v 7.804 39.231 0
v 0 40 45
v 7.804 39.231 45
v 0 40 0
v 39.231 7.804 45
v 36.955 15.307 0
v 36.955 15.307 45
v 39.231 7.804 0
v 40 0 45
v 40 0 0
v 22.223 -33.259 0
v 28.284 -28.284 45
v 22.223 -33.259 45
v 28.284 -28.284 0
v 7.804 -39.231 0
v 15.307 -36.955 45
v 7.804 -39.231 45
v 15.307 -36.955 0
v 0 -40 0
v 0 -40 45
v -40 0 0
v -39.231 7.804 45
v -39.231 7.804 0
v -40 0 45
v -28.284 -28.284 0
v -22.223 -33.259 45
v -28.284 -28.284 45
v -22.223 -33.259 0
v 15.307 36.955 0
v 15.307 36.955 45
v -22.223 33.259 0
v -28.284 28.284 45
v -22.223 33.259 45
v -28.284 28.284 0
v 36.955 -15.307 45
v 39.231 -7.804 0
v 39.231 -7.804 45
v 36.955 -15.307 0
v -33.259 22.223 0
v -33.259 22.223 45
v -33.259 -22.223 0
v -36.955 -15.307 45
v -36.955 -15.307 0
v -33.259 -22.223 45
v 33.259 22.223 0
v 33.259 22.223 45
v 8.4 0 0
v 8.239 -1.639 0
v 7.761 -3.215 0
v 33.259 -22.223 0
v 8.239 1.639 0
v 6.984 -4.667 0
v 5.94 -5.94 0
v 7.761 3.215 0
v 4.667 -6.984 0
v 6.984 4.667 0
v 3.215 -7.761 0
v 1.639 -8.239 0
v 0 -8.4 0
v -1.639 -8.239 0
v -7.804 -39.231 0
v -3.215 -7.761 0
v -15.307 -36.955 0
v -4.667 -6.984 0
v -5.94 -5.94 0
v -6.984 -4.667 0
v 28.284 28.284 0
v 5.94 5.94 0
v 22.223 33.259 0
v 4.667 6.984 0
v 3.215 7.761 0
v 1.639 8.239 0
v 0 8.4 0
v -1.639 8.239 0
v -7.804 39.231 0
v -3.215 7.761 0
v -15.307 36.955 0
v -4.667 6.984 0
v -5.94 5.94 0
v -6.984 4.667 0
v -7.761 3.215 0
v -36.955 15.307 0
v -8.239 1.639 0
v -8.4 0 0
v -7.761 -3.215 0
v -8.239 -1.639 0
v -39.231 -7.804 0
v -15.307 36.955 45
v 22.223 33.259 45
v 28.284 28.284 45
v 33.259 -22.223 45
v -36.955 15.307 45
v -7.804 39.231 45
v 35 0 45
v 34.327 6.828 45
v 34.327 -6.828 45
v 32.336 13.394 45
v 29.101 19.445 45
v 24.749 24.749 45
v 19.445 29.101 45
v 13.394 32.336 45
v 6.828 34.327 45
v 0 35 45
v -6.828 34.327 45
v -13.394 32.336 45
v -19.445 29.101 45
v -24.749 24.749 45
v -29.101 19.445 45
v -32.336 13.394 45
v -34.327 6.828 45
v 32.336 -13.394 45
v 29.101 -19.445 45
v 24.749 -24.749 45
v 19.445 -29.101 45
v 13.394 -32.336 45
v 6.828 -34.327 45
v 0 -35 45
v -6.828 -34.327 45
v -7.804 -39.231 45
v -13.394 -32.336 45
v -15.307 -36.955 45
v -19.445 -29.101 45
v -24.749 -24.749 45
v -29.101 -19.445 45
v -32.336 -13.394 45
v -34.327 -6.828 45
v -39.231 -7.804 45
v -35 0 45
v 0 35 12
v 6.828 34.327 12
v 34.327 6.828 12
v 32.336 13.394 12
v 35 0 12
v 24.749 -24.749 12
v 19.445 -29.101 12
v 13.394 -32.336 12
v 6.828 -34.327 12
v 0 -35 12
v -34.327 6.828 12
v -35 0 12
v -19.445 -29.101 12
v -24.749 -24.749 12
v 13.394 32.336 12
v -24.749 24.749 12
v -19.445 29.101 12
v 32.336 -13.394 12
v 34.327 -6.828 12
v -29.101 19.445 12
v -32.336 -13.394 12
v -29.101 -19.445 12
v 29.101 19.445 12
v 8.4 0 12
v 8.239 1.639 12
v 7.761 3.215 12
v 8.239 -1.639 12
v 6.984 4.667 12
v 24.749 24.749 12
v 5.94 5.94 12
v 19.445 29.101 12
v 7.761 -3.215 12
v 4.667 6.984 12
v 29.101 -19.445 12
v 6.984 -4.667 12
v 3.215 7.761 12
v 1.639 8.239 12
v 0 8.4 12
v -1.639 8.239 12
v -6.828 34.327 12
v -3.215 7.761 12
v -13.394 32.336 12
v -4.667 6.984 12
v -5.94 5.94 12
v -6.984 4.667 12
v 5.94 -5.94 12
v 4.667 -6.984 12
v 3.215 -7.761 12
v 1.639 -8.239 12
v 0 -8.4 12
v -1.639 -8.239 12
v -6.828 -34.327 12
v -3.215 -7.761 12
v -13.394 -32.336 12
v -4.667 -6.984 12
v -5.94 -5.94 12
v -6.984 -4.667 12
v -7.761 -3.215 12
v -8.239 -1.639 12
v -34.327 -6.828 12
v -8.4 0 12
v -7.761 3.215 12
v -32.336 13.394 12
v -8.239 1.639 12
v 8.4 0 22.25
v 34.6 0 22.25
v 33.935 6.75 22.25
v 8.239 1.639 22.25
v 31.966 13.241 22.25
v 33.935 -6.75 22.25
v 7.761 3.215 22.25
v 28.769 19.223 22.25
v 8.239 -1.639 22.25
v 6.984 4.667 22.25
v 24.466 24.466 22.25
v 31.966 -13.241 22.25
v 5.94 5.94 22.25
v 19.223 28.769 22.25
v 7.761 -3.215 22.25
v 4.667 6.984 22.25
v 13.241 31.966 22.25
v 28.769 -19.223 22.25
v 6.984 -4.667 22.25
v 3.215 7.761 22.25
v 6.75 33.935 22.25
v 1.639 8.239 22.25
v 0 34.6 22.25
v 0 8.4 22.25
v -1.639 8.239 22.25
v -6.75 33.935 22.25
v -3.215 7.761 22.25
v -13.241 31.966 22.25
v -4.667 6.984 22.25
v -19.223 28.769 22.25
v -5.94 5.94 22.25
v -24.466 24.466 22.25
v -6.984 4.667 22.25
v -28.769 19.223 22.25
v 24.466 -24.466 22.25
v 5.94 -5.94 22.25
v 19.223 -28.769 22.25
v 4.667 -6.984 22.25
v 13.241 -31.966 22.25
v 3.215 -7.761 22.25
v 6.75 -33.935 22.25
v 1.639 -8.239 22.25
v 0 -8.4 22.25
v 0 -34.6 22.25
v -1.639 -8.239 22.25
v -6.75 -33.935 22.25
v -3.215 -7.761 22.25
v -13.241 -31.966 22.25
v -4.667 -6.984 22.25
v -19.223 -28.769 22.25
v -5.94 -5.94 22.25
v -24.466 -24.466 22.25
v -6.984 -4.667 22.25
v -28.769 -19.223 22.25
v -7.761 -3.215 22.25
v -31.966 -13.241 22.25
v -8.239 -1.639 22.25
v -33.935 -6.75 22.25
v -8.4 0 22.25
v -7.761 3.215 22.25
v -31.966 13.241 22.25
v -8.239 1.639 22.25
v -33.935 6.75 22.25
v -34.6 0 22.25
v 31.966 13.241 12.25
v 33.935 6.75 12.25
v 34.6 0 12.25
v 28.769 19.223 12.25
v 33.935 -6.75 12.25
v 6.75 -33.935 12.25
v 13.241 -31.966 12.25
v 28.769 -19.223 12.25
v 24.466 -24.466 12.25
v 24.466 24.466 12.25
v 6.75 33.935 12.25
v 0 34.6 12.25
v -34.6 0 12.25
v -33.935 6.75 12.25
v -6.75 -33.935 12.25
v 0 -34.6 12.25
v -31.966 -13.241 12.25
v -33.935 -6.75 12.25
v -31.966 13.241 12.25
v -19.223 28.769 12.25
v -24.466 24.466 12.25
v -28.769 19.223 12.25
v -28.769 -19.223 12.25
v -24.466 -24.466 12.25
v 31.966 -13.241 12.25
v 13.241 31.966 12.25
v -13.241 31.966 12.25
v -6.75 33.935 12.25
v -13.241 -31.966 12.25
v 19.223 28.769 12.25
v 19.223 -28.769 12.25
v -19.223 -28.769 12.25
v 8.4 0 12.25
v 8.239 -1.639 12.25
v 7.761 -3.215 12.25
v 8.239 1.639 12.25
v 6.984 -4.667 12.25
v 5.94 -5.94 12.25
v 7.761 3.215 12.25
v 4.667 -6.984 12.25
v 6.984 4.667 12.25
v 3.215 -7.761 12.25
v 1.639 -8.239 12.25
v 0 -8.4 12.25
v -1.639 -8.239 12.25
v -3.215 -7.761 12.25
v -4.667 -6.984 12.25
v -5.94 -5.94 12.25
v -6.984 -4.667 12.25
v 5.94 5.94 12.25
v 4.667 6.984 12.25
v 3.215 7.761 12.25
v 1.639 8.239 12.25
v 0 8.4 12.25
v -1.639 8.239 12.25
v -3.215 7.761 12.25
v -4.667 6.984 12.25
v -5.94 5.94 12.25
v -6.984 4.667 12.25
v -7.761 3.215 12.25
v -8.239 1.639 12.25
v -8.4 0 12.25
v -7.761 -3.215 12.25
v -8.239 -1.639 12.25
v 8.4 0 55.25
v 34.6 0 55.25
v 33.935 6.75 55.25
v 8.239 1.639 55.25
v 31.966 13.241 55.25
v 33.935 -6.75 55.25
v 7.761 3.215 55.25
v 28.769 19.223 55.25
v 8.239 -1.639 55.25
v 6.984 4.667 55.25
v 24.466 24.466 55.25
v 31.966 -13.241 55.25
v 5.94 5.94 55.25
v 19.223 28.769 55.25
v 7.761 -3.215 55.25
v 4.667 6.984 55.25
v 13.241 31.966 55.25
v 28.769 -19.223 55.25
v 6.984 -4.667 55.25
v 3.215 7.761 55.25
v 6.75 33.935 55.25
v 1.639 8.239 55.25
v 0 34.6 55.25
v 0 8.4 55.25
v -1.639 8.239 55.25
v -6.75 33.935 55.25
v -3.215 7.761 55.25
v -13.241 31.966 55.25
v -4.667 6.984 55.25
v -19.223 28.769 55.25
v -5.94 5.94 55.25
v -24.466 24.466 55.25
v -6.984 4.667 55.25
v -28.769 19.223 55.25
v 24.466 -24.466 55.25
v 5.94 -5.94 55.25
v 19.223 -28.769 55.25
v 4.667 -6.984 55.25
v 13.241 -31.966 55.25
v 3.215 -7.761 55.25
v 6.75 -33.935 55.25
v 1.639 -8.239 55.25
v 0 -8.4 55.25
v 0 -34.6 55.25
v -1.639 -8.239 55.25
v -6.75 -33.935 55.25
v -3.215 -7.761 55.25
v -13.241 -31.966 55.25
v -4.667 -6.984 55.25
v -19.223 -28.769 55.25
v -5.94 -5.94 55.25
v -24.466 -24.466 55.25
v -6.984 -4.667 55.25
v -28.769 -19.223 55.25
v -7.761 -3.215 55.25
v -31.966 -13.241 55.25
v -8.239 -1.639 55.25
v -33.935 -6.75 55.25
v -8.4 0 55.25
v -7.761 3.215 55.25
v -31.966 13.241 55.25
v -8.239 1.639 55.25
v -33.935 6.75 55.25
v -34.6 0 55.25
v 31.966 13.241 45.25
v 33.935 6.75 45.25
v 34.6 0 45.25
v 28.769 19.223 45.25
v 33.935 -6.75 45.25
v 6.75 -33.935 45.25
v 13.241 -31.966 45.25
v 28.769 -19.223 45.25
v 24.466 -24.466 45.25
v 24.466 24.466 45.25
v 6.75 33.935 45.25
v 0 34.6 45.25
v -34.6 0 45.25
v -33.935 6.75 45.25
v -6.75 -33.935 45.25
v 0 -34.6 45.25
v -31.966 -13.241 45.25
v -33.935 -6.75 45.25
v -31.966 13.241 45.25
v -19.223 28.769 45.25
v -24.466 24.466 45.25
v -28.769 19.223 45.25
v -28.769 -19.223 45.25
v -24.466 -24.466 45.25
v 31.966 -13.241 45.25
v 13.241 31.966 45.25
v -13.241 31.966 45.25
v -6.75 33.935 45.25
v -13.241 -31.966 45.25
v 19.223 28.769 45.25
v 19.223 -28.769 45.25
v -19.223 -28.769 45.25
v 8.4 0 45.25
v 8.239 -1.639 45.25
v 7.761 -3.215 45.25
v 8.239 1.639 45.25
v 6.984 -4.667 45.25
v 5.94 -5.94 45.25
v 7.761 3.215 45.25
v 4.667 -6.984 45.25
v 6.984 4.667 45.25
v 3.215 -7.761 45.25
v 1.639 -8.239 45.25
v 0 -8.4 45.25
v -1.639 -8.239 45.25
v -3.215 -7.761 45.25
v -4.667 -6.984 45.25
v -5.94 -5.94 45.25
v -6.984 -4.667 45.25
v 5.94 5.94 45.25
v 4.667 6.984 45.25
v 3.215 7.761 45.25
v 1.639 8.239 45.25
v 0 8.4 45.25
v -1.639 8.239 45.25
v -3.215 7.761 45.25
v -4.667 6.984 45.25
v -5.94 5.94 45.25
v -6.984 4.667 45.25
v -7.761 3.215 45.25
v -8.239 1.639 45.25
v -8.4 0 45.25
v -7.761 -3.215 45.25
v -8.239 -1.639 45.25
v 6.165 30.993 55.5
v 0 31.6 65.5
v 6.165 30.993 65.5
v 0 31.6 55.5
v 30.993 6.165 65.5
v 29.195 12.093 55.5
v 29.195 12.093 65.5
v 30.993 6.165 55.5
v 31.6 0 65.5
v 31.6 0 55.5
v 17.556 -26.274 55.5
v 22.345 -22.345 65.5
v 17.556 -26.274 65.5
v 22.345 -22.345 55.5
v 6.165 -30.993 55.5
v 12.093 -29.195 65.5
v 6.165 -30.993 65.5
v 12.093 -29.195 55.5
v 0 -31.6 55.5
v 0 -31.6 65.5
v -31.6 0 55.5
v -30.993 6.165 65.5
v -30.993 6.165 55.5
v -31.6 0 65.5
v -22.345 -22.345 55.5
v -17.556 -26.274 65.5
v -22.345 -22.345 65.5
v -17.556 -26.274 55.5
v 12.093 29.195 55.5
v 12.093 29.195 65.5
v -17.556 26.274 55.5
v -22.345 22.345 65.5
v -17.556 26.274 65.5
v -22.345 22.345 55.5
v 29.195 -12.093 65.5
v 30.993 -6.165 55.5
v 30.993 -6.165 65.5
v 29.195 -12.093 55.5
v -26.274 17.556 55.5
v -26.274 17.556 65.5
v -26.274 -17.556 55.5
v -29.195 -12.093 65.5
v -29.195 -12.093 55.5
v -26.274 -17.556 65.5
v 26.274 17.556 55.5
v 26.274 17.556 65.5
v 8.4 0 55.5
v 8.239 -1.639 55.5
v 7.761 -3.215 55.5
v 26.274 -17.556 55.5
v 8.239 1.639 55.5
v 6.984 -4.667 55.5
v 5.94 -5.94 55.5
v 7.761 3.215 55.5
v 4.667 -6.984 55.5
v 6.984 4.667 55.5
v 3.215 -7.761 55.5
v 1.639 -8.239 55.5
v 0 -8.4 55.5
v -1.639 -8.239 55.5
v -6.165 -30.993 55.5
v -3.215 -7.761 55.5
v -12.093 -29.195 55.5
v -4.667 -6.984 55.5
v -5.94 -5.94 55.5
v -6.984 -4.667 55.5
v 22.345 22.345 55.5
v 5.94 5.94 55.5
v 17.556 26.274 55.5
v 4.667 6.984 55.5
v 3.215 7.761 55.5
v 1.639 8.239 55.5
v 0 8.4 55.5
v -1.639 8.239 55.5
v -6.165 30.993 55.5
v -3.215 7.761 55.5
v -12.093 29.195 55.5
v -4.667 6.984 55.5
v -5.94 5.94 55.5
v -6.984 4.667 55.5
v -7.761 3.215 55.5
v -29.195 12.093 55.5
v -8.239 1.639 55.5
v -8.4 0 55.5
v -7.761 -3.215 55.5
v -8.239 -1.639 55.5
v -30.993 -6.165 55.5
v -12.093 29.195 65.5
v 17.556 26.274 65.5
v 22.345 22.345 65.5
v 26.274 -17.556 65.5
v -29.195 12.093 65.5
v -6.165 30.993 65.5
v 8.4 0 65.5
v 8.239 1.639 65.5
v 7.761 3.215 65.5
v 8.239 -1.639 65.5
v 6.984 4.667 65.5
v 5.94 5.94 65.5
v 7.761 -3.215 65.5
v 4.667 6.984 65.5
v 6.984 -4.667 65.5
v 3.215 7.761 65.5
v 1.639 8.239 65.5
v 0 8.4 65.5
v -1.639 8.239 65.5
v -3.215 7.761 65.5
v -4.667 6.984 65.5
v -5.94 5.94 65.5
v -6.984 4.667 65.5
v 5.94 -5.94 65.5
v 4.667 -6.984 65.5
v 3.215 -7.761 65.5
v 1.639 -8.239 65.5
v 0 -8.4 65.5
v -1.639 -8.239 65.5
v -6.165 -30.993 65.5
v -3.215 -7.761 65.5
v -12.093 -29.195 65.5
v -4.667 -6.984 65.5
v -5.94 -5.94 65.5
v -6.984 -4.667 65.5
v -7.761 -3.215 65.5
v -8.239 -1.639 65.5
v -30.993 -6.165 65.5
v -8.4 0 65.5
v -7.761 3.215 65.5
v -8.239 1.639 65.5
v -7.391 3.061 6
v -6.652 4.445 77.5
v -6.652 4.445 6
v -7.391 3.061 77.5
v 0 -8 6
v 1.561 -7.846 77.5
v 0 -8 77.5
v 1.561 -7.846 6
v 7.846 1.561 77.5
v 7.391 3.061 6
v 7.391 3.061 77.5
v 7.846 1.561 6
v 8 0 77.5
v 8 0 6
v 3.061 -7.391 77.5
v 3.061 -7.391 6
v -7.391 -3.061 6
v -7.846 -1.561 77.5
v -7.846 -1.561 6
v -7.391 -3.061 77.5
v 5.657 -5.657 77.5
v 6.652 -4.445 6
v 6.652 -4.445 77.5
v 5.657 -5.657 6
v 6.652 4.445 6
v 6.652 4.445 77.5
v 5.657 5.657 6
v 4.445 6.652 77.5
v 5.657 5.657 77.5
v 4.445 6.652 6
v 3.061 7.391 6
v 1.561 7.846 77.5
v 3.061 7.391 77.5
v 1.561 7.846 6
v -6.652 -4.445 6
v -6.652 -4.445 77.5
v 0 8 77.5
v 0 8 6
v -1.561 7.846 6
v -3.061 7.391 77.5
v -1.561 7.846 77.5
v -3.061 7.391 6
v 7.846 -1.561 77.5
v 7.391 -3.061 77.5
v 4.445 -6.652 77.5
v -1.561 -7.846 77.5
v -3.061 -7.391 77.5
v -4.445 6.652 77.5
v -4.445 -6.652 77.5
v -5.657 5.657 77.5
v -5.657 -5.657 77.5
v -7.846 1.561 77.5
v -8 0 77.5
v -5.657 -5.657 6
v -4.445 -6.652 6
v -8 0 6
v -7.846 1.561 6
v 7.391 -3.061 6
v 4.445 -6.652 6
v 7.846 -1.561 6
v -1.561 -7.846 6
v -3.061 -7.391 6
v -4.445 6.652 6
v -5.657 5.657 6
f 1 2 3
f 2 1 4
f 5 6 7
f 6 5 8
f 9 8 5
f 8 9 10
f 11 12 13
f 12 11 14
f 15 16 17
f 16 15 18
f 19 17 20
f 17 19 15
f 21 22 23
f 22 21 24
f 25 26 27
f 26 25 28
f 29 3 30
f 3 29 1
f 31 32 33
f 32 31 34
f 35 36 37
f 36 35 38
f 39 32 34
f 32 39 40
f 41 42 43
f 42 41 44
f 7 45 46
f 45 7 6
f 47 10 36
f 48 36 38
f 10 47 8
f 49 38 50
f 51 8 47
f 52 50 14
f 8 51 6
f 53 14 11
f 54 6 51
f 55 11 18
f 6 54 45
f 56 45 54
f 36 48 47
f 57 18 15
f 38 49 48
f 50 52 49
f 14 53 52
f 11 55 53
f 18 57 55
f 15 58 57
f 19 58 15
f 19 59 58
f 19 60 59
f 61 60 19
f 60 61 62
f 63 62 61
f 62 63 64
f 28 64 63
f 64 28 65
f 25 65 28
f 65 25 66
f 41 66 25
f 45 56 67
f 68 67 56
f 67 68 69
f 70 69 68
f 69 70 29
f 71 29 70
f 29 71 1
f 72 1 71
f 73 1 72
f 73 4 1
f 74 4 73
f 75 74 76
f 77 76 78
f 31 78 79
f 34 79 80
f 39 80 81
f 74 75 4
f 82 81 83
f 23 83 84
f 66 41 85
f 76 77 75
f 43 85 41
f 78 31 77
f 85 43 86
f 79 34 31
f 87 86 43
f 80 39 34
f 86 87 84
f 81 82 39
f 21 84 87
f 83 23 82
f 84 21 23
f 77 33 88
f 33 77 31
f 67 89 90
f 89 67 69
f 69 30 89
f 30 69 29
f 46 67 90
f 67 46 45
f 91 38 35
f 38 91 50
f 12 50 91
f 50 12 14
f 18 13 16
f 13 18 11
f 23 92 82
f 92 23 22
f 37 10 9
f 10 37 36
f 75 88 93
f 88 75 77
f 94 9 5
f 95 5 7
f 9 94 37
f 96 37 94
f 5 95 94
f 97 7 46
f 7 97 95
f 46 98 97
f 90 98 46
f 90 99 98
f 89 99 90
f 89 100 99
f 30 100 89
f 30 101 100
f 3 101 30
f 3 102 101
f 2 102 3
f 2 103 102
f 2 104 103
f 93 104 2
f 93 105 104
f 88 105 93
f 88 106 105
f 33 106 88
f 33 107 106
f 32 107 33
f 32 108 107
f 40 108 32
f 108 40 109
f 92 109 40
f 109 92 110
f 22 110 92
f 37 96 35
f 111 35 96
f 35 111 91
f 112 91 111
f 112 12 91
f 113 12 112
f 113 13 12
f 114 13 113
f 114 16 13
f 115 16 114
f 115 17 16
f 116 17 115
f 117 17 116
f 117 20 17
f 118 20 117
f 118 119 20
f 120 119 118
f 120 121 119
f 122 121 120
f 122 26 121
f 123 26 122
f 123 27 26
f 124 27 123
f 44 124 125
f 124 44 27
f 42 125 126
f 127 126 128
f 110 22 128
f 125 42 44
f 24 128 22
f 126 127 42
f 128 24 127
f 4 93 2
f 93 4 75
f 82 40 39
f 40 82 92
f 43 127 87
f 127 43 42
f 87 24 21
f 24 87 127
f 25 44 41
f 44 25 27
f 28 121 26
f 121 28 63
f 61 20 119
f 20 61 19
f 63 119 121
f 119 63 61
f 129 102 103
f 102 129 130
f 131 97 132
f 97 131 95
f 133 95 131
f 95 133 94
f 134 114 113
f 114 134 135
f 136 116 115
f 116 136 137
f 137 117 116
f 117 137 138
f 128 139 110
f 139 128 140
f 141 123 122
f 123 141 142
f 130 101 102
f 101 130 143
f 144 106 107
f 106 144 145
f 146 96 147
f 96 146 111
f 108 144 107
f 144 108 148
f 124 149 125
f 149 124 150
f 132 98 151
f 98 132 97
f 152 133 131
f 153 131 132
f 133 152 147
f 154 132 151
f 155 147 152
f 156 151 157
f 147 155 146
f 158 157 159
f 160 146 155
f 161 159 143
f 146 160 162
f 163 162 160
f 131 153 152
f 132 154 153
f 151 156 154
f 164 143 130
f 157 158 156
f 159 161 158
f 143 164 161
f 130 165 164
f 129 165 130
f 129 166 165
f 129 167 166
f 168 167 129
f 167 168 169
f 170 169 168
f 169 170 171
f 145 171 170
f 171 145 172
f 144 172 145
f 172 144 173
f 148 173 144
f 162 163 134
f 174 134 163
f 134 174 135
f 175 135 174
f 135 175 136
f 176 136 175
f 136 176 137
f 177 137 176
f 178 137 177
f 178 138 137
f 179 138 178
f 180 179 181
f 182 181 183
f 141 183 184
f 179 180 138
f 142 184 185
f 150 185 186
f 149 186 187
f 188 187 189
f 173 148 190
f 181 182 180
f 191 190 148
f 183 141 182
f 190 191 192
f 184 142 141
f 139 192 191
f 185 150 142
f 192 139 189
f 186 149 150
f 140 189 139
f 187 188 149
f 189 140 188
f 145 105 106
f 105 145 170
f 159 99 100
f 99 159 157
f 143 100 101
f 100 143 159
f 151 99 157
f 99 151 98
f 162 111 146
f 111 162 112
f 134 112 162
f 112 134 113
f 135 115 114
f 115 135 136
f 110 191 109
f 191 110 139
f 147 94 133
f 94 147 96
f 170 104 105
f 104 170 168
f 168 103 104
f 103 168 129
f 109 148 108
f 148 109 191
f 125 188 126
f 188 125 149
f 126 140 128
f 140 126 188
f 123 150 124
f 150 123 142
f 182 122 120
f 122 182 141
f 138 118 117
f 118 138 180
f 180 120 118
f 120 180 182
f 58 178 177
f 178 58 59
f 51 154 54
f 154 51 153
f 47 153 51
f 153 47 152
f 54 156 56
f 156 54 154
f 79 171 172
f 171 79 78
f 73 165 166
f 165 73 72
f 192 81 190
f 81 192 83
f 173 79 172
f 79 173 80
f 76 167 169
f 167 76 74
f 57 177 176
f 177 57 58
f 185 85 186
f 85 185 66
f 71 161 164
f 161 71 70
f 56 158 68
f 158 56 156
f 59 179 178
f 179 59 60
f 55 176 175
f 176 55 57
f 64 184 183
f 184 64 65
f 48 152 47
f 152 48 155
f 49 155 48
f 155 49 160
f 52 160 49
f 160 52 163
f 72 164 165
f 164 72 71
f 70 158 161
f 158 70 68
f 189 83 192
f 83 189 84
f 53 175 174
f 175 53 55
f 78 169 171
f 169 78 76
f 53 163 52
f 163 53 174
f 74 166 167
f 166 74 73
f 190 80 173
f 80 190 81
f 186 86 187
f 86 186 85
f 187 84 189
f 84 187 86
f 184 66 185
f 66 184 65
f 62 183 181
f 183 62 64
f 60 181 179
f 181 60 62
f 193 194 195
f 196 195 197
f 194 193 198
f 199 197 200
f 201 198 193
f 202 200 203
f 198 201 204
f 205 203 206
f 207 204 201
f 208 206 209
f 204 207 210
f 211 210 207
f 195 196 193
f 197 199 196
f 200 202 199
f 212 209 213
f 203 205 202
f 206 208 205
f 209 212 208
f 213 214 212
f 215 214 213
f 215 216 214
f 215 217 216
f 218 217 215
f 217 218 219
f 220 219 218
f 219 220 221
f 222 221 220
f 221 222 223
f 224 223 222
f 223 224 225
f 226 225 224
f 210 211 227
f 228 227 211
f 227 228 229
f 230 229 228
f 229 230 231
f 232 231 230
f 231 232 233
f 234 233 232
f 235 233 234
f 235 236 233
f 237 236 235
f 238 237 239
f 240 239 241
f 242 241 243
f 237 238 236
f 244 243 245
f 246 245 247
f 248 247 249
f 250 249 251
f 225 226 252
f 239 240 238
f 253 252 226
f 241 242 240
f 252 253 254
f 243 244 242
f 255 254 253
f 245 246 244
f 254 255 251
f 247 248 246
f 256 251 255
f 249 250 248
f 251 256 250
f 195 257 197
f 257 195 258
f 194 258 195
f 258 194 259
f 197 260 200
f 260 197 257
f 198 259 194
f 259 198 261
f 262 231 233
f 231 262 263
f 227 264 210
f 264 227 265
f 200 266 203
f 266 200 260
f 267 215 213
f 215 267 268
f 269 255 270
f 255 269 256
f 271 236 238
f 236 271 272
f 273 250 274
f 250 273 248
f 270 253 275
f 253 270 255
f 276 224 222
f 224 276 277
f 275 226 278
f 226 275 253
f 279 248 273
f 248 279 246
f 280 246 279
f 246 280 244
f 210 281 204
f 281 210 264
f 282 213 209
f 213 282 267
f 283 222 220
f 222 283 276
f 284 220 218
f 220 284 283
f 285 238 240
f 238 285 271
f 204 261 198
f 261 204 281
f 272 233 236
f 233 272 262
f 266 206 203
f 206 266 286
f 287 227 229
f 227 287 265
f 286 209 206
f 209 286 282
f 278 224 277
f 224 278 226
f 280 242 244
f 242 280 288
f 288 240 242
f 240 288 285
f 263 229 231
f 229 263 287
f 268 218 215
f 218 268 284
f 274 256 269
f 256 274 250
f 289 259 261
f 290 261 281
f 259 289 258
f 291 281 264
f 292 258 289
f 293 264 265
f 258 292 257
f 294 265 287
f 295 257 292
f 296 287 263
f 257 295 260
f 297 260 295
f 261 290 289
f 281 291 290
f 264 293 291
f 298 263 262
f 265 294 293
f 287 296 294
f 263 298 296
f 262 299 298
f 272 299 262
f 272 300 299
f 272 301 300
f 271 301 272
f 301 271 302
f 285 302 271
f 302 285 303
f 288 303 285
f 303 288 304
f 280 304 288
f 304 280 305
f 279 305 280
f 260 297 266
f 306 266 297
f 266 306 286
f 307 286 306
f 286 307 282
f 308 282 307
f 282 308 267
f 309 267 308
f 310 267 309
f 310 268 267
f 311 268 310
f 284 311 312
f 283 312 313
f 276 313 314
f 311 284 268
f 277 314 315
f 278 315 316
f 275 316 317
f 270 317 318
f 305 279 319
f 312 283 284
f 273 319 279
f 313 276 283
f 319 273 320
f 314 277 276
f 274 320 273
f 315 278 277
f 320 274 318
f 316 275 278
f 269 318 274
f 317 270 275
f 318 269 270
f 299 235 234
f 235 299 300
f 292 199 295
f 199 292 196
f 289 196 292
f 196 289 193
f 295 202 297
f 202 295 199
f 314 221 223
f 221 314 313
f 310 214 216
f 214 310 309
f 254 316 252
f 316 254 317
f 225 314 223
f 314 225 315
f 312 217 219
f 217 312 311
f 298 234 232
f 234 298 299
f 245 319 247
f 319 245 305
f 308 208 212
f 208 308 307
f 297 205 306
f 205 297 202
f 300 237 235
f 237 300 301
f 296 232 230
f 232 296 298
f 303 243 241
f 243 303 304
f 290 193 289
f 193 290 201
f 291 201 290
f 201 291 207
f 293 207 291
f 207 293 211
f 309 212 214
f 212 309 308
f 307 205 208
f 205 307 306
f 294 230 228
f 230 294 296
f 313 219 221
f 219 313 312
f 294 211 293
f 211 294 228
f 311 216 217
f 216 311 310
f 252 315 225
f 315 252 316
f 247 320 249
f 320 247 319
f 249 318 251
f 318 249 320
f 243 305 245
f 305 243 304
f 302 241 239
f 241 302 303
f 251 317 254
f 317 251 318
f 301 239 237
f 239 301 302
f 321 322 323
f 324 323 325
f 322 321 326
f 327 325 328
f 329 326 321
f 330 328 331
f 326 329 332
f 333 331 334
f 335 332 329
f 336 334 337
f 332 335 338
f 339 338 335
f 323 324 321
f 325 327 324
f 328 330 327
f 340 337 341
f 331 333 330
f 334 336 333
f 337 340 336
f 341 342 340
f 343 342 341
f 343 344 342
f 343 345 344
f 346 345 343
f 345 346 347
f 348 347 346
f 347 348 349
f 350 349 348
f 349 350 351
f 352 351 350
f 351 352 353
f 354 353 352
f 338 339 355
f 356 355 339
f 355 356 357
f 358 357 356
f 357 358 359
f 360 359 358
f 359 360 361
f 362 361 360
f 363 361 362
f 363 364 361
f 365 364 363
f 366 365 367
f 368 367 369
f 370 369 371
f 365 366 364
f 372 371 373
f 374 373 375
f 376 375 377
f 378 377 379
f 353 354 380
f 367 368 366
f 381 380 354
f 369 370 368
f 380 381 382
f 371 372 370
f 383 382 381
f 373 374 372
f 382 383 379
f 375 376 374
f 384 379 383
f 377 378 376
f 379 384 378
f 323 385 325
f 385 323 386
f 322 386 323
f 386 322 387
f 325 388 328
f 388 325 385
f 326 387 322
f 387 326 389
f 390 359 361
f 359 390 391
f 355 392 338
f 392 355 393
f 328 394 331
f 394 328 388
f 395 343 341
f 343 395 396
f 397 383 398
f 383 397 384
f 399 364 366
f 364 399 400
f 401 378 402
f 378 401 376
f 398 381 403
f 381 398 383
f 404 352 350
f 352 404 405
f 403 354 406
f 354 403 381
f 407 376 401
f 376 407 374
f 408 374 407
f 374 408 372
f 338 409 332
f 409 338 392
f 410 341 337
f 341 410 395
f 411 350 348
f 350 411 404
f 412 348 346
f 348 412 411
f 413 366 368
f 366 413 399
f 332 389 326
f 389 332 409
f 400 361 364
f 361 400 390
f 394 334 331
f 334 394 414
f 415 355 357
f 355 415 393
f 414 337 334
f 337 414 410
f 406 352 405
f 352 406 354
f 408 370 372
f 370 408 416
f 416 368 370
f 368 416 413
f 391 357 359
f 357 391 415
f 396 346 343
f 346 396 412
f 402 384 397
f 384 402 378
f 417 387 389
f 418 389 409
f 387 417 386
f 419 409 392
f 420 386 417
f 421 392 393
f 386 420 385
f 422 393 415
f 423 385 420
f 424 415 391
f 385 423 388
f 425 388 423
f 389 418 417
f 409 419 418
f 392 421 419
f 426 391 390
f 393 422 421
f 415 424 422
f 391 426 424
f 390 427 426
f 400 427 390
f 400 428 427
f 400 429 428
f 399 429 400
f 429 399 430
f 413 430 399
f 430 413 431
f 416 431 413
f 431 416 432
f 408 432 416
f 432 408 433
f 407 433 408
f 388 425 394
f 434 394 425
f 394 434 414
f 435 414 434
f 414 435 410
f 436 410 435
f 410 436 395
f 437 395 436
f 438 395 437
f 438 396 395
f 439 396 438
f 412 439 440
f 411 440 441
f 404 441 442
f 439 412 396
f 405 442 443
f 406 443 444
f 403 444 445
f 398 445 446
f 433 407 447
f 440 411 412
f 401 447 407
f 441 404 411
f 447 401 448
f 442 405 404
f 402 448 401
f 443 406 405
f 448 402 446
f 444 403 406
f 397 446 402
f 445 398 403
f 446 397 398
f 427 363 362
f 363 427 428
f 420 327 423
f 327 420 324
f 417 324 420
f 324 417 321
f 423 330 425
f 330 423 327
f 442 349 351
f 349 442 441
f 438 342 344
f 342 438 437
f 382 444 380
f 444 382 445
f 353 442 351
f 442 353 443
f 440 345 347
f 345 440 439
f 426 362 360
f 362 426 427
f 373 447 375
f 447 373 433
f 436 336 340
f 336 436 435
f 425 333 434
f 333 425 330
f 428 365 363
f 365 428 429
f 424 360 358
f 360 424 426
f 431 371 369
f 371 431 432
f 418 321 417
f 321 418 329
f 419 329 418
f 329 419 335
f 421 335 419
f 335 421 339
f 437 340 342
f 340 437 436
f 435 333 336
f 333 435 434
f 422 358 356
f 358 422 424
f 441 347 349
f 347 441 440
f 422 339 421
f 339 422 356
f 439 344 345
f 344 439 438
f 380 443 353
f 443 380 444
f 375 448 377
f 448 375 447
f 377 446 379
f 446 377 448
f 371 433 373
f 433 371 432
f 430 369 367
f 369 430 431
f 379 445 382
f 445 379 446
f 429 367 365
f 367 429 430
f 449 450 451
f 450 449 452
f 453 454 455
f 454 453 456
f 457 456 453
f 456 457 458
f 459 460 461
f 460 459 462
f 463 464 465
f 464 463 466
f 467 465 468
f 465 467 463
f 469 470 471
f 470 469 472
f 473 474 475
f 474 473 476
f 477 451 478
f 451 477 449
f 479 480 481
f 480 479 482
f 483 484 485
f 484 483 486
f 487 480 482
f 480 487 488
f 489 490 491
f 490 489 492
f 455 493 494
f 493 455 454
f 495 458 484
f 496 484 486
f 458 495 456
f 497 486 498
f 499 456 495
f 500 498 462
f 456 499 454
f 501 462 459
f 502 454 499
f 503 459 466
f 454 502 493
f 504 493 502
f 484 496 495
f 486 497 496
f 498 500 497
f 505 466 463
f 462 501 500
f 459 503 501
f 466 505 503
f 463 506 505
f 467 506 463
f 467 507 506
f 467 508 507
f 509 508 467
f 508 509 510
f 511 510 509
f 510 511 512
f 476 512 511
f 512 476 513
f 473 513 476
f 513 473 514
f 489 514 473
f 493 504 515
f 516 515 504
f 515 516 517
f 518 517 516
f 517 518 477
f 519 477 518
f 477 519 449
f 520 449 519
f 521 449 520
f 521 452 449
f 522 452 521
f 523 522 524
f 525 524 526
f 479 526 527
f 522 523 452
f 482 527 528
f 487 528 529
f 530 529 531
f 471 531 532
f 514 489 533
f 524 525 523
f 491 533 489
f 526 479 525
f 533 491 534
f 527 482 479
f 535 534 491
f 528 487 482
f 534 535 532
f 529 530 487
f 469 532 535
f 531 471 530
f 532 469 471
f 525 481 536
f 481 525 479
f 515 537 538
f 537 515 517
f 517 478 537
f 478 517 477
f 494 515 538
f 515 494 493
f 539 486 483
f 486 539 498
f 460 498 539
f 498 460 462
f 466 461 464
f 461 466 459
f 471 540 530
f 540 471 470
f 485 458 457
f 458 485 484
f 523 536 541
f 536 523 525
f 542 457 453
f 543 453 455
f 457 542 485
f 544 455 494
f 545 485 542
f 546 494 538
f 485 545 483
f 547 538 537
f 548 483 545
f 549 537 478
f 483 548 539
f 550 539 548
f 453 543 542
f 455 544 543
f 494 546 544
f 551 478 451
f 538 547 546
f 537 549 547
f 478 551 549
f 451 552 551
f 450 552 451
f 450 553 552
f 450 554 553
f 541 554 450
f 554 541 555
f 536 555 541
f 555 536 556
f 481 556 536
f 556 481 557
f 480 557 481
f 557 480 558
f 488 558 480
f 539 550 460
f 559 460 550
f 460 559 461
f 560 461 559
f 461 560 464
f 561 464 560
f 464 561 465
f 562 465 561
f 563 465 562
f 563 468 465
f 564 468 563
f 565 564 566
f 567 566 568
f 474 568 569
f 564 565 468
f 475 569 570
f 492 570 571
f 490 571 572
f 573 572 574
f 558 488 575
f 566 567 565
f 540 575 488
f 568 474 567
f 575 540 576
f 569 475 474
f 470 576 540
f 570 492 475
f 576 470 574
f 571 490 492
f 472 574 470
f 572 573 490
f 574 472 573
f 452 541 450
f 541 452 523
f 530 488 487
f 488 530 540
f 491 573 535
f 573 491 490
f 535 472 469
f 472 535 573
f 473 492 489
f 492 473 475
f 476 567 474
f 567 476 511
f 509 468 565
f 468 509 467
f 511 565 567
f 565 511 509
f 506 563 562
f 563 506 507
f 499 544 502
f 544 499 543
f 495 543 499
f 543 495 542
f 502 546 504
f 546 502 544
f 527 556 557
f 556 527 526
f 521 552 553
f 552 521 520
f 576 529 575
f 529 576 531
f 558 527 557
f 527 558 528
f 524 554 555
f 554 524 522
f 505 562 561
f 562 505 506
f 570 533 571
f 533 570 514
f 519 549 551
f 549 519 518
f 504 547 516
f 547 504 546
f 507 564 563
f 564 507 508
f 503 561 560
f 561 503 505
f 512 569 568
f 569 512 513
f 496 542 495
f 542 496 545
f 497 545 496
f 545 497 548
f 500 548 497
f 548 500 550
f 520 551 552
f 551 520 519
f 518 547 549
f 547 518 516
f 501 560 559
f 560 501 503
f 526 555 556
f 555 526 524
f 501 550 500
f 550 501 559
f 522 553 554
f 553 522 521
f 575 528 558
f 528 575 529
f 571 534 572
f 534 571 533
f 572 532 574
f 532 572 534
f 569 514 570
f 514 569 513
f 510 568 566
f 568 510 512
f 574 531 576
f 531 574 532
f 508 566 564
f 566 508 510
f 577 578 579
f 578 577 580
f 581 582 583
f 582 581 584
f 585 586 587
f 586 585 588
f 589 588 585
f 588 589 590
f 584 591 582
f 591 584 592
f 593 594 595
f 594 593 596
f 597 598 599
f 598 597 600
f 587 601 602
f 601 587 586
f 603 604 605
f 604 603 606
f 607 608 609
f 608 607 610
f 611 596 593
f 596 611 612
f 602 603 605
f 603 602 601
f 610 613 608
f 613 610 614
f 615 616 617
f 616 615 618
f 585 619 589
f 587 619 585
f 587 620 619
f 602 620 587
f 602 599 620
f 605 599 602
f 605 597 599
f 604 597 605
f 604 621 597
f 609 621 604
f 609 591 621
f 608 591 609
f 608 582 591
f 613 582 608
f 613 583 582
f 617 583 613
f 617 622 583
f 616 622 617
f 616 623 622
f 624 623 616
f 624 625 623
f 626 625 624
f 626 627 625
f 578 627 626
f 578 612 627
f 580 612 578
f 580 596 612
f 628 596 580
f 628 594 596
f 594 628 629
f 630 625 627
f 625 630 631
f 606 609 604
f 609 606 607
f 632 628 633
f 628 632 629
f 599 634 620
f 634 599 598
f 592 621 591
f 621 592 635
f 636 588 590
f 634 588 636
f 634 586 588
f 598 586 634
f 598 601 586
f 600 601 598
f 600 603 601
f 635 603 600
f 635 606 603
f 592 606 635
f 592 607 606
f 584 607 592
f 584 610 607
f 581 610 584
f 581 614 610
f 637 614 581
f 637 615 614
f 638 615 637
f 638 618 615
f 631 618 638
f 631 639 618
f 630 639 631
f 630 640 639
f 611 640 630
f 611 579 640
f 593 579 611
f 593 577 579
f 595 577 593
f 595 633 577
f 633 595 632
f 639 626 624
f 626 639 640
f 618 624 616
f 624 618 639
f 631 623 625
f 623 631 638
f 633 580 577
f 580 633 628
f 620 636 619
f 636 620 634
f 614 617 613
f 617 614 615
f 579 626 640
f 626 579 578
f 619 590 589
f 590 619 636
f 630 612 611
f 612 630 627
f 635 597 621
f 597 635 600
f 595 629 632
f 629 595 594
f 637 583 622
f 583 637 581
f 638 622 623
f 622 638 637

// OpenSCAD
$fn = 32;

// ------------------------------------------------------------------------
// Bearing housing: housing d80, two bearings and a shaft
// Every part is its own module, assembly() places them once.
// ------------------------------------------------------------------------

// --- part 1 ---
module housing() {
  difference() {
    cylinder(h = 45, d = 80);
    translate([0, 0, 12]) cylinder(h = 34, d = 70);
    translate([0, 0, -1]) cylinder(h = 14, d = 16.8);
  }
}

// --- part 2 ---
module bearing_lower() {
  difference() {
      translate([0, 0, 0]) cylinder(h = 10, d = 69.2);
      translate([0, 0, -1]) cylinder(h = 12, d = 16.8);
    }
}

// --- part 3 ---
module bearing_upper() {
  difference() {
      translate([0, 0, 0]) cylinder(h = 10, d = 69.2);
      translate([0, 0, -1]) cylinder(h = 12, d = 16.8);
    }
}

// --- part 4 ---
module spacer() {
  difference() {
      translate([0, 0, 0]) cylinder(h = 10, d = 63.2);
      translate([0, 0, -1]) cylinder(h = 12, d = 16.8);
    }
}

// --- part 5 ---
module shaft() {
  translate([0, 0, -35.75]) cylinder(h = 71.5, d = 16);
}

// --- assembly ---
module assembly() {
  translate([0, 0, 0]) rotate([0, 0, 0]) housing();
  translate([0, 0, 12.25]) rotate([0, 0, 0]) bearing_lower();
  translate([0, 0, 45.25]) rotate([0, 0, 0]) bearing_upper();
  translate([0, 0, 55.5]) rotate([0, 0, 0]) spacer();
  translate([0, 0, 41.75]) rotate([0, 0, 0]) shaft();
}

assembly();
